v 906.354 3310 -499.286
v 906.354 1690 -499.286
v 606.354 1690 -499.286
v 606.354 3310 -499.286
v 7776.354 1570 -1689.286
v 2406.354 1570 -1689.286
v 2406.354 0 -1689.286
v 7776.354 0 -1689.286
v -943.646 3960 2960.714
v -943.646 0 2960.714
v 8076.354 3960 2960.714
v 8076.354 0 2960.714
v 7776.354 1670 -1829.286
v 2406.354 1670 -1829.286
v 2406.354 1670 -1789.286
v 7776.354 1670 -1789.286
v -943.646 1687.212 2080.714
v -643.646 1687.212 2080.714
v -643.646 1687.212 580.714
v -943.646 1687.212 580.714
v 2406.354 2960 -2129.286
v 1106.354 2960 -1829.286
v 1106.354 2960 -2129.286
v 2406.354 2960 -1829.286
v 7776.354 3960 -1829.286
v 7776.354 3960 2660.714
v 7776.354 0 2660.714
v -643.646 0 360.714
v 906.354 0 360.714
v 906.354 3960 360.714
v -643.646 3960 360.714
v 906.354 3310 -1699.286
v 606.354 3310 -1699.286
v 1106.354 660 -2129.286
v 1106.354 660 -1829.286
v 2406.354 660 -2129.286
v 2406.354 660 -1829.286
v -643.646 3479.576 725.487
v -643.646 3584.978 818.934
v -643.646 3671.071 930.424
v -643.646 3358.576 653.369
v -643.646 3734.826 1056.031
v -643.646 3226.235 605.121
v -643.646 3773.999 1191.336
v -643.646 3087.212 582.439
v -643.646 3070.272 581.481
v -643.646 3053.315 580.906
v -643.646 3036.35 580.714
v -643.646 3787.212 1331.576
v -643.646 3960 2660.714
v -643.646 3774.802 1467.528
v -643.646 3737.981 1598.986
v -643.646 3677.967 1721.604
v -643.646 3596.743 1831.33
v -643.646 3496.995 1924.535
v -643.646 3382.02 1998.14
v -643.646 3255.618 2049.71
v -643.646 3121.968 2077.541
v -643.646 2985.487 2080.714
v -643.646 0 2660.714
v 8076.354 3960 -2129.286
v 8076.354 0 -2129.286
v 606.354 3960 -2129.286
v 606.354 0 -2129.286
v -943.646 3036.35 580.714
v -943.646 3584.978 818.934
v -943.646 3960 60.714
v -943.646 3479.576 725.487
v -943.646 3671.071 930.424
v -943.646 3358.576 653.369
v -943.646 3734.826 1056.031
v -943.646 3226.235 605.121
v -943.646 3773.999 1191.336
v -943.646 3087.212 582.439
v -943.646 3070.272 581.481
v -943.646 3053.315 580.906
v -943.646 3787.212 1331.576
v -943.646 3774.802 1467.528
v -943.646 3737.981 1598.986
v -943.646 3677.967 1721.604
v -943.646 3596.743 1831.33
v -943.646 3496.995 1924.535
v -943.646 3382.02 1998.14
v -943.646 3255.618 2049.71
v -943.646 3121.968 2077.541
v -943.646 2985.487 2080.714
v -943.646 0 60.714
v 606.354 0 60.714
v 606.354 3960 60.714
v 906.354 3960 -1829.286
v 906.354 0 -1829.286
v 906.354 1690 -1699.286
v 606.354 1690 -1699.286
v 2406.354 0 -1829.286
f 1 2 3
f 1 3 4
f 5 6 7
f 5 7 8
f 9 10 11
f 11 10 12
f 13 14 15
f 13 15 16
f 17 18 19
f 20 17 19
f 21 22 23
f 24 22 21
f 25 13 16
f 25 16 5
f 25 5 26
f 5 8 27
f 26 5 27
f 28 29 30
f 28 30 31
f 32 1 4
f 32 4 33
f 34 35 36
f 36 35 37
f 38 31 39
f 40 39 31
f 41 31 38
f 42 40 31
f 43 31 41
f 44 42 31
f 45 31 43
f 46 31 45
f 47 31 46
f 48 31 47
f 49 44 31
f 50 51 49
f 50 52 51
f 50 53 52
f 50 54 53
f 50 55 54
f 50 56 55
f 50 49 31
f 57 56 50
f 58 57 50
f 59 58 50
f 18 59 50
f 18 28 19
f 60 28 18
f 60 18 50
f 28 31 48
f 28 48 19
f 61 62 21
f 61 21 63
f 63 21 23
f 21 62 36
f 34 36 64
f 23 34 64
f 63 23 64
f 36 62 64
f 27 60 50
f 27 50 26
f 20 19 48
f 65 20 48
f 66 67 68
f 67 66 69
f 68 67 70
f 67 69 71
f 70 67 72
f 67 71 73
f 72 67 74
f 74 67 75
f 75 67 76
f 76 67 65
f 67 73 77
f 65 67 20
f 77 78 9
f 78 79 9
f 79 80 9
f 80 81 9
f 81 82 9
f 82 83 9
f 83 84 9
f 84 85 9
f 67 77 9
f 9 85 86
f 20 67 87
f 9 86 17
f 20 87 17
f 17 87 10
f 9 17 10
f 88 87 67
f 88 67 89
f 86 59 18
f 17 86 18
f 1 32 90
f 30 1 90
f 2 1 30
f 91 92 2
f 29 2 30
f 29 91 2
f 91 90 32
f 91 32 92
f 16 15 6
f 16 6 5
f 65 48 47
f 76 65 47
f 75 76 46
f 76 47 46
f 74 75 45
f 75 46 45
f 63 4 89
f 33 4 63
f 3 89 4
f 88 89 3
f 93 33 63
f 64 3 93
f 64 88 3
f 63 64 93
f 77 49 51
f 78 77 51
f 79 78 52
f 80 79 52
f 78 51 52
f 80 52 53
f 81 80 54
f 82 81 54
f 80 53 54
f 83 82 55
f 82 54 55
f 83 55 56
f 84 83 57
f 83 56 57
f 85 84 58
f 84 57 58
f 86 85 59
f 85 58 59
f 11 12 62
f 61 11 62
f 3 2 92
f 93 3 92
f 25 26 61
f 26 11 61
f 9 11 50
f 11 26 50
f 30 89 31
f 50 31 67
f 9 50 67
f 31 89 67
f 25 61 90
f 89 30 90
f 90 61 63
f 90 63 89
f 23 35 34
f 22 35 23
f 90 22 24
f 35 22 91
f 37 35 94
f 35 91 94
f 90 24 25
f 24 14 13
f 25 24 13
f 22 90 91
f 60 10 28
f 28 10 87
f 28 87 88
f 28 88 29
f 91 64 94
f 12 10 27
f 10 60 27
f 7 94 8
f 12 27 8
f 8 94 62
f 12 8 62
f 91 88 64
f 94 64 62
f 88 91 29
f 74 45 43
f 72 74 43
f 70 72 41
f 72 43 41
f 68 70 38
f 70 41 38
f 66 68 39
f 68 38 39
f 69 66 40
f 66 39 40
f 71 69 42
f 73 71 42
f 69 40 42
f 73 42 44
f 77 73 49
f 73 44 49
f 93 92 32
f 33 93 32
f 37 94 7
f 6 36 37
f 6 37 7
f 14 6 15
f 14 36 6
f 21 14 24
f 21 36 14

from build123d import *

# Parameters (mm, degrees)
SKETCH_1_W             = 6870
SKETCH_1_H             = 300
EXTRUDE_1381_DEPTH     = 3960
SKETCH_3_W             = 1300
SKETCH_3_H             = 2300
CUT_EXTRUDE_1685_DEPTH = 300
SKETCH_4_W             = 5370
SKETCH_4_H             = 1670
EXTRUDE_1932_DEPTH     = 140
FILLET_START           = -84.347935733
FILLET_1_OUTLINE_W     = 5370
FILLET_1_OUTLINE_H     = 141.421356237
FILLET_1_DEPTH         = 71.347935733
SKETCH_5_W             = 1200
SKETCH_5_H             = 1620
CUT_EXTRUDE_2305_DEPTH = 300
CUT_EXTRUDE_2865_DEPTH = 300


with BuildPart() as part:
    # Эскиз1 → Extrude 1381 (new body)
    with BuildSketch(Plane(origin=(0, 0, 0), x_dir=(1, 0, 0), z_dir=(0, 1, 0))):
        Polygon((8076.35402749, -2660.714005328), (7776.35402749, -2660.714005328), (7776.35402749, 1829.285994672), (7776.35402749, 2129.285994672), (8076.35402749, 2129.285994672), align=None)
        with Locations((4341.35402749, 1979.285994672)):
            Rectangle(SKETCH_1_W, SKETCH_1_H)
        Polygon((-643.64597251, -2960.714005328), (-643.64597251, -2660.714005328), (7776.35402749, -2660.714005328), (8076.35402749, -2660.714005328), (8076.35402749, -2960.714005328), align=None)
        Polygon((-943.64597251, -360.714005328), (-643.64597251, -360.714005328), (-643.64597251, -2660.714005328), (-643.64597251, -2960.714005328), (-943.64597251, -2960.714005328), align=None)
        Polygon((-943.64597251, -60.714005328), (606.35402749, -60.714005328), (606.35402749, 2129.285994672), (906.35402749, 2129.285994672), (906.35402749, 1829.285994672), (906.35402749, -360.714005328), (-643.64597251, -360.714005328), (-943.64597251, -360.714005328), align=None)
    extrude(amount=EXTRUDE_1381_DEPTH)

    # Эскиз3 → Cut-Extrude 1685 (cut)
    with BuildSketch(Plane.XY.offset(-1829.285994672)):
        with Locations((1756.35402749, 1810)):
            Rectangle(SKETCH_3_W, SKETCH_3_H)
    extrude(amount=-CUT_EXTRUDE_1685_DEPTH, mode=Mode.SUBTRACT)

    # Эскиз4 → Extrude 1932 (add)
    with BuildSketch(Plane.XY.offset(-1829.285994672)):
        with Locations((5091.35402749, 835)):
            Rectangle(SKETCH_4_W, SKETCH_4_H)
    extrude(amount=EXTRUDE_1932_DEPTH)

    # Фаска1: read off the stored shape, not the designer's step
    # Фаска1 outline → Фаска1 (cut)
    with BuildSketch(Plane(origin=(0, 0, 0), x_dir=(1, 0, 0), z_dir=(0, 0.7071067811865476, 0.7071067811865476)).offset(FILLET_START)):
        with Locations((5091.35402749, 2375.373906778)):
            Rectangle(FILLET_1_OUTLINE_W, FILLET_1_OUTLINE_H)
    extrude(amount=FILLET_1_DEPTH, mode=Mode.SUBTRACT)

    # Эскиз5 → Cut-Extrude 2305 (cut)
    with BuildSketch(Plane(origin=(906.35402749, 0, 0), x_dir=(0, 0, -1), z_dir=(1, 0, 0))):
        with Locations((1099.285994672, 2500)):
            Rectangle(SKETCH_5_W, SKETCH_5_H)
    extrude(amount=-CUT_EXTRUDE_2305_DEPTH, mode=Mode.SUBTRACT)

    # Эскиз6 → Cut-Extrude 2865 (cut)
    with BuildSketch(Plane(origin=(-643.64597251, 0, 0), x_dir=(0, 0, -1), z_dir=(1, 0, 0))):
        with BuildLine():
            ThreePointArc((-1331.576330709, 3787.212133652), (-1880.20408957, 3548.991802146), (-2080.714005328, 2985.48748289))
            Line((-2080.714005328, 2985.48748289), (-2080.714005328, 1687.212133652))
            Line((-2080.714005328, 1687.212133652), (-1330.714005328, 1687.212133652))
            Line((-1330.714005328, 1687.212133652), (-1331.576330709, 3787.212133652))
        make_face()
        with BuildLine():
            ThreePointArc((-582.43865609, 3087.212133652), (-818.934336835, 3584.977567133), (-1331.576330709, 3787.212133652))
            Line((-1331.576330709, 3787.212133652), (-1330.714005328, 1687.212133652))
            Line((-1330.714005328, 1687.212133652), (-580.714005328, 1687.212133652))
            Line((-580.714005328, 1687.212133652), (-580.714005328, 3036.349808271))
            ThreePointArc((-580.714005328, 3036.349808271), (-581.145291881, 3061.79558672), (-582.43865609, 3087.212133652))
        make_face()
    extrude(amount=-CUT_EXTRUDE_2865_DEPTH, mode=Mode.SUBTRACT)


solid = part.part
